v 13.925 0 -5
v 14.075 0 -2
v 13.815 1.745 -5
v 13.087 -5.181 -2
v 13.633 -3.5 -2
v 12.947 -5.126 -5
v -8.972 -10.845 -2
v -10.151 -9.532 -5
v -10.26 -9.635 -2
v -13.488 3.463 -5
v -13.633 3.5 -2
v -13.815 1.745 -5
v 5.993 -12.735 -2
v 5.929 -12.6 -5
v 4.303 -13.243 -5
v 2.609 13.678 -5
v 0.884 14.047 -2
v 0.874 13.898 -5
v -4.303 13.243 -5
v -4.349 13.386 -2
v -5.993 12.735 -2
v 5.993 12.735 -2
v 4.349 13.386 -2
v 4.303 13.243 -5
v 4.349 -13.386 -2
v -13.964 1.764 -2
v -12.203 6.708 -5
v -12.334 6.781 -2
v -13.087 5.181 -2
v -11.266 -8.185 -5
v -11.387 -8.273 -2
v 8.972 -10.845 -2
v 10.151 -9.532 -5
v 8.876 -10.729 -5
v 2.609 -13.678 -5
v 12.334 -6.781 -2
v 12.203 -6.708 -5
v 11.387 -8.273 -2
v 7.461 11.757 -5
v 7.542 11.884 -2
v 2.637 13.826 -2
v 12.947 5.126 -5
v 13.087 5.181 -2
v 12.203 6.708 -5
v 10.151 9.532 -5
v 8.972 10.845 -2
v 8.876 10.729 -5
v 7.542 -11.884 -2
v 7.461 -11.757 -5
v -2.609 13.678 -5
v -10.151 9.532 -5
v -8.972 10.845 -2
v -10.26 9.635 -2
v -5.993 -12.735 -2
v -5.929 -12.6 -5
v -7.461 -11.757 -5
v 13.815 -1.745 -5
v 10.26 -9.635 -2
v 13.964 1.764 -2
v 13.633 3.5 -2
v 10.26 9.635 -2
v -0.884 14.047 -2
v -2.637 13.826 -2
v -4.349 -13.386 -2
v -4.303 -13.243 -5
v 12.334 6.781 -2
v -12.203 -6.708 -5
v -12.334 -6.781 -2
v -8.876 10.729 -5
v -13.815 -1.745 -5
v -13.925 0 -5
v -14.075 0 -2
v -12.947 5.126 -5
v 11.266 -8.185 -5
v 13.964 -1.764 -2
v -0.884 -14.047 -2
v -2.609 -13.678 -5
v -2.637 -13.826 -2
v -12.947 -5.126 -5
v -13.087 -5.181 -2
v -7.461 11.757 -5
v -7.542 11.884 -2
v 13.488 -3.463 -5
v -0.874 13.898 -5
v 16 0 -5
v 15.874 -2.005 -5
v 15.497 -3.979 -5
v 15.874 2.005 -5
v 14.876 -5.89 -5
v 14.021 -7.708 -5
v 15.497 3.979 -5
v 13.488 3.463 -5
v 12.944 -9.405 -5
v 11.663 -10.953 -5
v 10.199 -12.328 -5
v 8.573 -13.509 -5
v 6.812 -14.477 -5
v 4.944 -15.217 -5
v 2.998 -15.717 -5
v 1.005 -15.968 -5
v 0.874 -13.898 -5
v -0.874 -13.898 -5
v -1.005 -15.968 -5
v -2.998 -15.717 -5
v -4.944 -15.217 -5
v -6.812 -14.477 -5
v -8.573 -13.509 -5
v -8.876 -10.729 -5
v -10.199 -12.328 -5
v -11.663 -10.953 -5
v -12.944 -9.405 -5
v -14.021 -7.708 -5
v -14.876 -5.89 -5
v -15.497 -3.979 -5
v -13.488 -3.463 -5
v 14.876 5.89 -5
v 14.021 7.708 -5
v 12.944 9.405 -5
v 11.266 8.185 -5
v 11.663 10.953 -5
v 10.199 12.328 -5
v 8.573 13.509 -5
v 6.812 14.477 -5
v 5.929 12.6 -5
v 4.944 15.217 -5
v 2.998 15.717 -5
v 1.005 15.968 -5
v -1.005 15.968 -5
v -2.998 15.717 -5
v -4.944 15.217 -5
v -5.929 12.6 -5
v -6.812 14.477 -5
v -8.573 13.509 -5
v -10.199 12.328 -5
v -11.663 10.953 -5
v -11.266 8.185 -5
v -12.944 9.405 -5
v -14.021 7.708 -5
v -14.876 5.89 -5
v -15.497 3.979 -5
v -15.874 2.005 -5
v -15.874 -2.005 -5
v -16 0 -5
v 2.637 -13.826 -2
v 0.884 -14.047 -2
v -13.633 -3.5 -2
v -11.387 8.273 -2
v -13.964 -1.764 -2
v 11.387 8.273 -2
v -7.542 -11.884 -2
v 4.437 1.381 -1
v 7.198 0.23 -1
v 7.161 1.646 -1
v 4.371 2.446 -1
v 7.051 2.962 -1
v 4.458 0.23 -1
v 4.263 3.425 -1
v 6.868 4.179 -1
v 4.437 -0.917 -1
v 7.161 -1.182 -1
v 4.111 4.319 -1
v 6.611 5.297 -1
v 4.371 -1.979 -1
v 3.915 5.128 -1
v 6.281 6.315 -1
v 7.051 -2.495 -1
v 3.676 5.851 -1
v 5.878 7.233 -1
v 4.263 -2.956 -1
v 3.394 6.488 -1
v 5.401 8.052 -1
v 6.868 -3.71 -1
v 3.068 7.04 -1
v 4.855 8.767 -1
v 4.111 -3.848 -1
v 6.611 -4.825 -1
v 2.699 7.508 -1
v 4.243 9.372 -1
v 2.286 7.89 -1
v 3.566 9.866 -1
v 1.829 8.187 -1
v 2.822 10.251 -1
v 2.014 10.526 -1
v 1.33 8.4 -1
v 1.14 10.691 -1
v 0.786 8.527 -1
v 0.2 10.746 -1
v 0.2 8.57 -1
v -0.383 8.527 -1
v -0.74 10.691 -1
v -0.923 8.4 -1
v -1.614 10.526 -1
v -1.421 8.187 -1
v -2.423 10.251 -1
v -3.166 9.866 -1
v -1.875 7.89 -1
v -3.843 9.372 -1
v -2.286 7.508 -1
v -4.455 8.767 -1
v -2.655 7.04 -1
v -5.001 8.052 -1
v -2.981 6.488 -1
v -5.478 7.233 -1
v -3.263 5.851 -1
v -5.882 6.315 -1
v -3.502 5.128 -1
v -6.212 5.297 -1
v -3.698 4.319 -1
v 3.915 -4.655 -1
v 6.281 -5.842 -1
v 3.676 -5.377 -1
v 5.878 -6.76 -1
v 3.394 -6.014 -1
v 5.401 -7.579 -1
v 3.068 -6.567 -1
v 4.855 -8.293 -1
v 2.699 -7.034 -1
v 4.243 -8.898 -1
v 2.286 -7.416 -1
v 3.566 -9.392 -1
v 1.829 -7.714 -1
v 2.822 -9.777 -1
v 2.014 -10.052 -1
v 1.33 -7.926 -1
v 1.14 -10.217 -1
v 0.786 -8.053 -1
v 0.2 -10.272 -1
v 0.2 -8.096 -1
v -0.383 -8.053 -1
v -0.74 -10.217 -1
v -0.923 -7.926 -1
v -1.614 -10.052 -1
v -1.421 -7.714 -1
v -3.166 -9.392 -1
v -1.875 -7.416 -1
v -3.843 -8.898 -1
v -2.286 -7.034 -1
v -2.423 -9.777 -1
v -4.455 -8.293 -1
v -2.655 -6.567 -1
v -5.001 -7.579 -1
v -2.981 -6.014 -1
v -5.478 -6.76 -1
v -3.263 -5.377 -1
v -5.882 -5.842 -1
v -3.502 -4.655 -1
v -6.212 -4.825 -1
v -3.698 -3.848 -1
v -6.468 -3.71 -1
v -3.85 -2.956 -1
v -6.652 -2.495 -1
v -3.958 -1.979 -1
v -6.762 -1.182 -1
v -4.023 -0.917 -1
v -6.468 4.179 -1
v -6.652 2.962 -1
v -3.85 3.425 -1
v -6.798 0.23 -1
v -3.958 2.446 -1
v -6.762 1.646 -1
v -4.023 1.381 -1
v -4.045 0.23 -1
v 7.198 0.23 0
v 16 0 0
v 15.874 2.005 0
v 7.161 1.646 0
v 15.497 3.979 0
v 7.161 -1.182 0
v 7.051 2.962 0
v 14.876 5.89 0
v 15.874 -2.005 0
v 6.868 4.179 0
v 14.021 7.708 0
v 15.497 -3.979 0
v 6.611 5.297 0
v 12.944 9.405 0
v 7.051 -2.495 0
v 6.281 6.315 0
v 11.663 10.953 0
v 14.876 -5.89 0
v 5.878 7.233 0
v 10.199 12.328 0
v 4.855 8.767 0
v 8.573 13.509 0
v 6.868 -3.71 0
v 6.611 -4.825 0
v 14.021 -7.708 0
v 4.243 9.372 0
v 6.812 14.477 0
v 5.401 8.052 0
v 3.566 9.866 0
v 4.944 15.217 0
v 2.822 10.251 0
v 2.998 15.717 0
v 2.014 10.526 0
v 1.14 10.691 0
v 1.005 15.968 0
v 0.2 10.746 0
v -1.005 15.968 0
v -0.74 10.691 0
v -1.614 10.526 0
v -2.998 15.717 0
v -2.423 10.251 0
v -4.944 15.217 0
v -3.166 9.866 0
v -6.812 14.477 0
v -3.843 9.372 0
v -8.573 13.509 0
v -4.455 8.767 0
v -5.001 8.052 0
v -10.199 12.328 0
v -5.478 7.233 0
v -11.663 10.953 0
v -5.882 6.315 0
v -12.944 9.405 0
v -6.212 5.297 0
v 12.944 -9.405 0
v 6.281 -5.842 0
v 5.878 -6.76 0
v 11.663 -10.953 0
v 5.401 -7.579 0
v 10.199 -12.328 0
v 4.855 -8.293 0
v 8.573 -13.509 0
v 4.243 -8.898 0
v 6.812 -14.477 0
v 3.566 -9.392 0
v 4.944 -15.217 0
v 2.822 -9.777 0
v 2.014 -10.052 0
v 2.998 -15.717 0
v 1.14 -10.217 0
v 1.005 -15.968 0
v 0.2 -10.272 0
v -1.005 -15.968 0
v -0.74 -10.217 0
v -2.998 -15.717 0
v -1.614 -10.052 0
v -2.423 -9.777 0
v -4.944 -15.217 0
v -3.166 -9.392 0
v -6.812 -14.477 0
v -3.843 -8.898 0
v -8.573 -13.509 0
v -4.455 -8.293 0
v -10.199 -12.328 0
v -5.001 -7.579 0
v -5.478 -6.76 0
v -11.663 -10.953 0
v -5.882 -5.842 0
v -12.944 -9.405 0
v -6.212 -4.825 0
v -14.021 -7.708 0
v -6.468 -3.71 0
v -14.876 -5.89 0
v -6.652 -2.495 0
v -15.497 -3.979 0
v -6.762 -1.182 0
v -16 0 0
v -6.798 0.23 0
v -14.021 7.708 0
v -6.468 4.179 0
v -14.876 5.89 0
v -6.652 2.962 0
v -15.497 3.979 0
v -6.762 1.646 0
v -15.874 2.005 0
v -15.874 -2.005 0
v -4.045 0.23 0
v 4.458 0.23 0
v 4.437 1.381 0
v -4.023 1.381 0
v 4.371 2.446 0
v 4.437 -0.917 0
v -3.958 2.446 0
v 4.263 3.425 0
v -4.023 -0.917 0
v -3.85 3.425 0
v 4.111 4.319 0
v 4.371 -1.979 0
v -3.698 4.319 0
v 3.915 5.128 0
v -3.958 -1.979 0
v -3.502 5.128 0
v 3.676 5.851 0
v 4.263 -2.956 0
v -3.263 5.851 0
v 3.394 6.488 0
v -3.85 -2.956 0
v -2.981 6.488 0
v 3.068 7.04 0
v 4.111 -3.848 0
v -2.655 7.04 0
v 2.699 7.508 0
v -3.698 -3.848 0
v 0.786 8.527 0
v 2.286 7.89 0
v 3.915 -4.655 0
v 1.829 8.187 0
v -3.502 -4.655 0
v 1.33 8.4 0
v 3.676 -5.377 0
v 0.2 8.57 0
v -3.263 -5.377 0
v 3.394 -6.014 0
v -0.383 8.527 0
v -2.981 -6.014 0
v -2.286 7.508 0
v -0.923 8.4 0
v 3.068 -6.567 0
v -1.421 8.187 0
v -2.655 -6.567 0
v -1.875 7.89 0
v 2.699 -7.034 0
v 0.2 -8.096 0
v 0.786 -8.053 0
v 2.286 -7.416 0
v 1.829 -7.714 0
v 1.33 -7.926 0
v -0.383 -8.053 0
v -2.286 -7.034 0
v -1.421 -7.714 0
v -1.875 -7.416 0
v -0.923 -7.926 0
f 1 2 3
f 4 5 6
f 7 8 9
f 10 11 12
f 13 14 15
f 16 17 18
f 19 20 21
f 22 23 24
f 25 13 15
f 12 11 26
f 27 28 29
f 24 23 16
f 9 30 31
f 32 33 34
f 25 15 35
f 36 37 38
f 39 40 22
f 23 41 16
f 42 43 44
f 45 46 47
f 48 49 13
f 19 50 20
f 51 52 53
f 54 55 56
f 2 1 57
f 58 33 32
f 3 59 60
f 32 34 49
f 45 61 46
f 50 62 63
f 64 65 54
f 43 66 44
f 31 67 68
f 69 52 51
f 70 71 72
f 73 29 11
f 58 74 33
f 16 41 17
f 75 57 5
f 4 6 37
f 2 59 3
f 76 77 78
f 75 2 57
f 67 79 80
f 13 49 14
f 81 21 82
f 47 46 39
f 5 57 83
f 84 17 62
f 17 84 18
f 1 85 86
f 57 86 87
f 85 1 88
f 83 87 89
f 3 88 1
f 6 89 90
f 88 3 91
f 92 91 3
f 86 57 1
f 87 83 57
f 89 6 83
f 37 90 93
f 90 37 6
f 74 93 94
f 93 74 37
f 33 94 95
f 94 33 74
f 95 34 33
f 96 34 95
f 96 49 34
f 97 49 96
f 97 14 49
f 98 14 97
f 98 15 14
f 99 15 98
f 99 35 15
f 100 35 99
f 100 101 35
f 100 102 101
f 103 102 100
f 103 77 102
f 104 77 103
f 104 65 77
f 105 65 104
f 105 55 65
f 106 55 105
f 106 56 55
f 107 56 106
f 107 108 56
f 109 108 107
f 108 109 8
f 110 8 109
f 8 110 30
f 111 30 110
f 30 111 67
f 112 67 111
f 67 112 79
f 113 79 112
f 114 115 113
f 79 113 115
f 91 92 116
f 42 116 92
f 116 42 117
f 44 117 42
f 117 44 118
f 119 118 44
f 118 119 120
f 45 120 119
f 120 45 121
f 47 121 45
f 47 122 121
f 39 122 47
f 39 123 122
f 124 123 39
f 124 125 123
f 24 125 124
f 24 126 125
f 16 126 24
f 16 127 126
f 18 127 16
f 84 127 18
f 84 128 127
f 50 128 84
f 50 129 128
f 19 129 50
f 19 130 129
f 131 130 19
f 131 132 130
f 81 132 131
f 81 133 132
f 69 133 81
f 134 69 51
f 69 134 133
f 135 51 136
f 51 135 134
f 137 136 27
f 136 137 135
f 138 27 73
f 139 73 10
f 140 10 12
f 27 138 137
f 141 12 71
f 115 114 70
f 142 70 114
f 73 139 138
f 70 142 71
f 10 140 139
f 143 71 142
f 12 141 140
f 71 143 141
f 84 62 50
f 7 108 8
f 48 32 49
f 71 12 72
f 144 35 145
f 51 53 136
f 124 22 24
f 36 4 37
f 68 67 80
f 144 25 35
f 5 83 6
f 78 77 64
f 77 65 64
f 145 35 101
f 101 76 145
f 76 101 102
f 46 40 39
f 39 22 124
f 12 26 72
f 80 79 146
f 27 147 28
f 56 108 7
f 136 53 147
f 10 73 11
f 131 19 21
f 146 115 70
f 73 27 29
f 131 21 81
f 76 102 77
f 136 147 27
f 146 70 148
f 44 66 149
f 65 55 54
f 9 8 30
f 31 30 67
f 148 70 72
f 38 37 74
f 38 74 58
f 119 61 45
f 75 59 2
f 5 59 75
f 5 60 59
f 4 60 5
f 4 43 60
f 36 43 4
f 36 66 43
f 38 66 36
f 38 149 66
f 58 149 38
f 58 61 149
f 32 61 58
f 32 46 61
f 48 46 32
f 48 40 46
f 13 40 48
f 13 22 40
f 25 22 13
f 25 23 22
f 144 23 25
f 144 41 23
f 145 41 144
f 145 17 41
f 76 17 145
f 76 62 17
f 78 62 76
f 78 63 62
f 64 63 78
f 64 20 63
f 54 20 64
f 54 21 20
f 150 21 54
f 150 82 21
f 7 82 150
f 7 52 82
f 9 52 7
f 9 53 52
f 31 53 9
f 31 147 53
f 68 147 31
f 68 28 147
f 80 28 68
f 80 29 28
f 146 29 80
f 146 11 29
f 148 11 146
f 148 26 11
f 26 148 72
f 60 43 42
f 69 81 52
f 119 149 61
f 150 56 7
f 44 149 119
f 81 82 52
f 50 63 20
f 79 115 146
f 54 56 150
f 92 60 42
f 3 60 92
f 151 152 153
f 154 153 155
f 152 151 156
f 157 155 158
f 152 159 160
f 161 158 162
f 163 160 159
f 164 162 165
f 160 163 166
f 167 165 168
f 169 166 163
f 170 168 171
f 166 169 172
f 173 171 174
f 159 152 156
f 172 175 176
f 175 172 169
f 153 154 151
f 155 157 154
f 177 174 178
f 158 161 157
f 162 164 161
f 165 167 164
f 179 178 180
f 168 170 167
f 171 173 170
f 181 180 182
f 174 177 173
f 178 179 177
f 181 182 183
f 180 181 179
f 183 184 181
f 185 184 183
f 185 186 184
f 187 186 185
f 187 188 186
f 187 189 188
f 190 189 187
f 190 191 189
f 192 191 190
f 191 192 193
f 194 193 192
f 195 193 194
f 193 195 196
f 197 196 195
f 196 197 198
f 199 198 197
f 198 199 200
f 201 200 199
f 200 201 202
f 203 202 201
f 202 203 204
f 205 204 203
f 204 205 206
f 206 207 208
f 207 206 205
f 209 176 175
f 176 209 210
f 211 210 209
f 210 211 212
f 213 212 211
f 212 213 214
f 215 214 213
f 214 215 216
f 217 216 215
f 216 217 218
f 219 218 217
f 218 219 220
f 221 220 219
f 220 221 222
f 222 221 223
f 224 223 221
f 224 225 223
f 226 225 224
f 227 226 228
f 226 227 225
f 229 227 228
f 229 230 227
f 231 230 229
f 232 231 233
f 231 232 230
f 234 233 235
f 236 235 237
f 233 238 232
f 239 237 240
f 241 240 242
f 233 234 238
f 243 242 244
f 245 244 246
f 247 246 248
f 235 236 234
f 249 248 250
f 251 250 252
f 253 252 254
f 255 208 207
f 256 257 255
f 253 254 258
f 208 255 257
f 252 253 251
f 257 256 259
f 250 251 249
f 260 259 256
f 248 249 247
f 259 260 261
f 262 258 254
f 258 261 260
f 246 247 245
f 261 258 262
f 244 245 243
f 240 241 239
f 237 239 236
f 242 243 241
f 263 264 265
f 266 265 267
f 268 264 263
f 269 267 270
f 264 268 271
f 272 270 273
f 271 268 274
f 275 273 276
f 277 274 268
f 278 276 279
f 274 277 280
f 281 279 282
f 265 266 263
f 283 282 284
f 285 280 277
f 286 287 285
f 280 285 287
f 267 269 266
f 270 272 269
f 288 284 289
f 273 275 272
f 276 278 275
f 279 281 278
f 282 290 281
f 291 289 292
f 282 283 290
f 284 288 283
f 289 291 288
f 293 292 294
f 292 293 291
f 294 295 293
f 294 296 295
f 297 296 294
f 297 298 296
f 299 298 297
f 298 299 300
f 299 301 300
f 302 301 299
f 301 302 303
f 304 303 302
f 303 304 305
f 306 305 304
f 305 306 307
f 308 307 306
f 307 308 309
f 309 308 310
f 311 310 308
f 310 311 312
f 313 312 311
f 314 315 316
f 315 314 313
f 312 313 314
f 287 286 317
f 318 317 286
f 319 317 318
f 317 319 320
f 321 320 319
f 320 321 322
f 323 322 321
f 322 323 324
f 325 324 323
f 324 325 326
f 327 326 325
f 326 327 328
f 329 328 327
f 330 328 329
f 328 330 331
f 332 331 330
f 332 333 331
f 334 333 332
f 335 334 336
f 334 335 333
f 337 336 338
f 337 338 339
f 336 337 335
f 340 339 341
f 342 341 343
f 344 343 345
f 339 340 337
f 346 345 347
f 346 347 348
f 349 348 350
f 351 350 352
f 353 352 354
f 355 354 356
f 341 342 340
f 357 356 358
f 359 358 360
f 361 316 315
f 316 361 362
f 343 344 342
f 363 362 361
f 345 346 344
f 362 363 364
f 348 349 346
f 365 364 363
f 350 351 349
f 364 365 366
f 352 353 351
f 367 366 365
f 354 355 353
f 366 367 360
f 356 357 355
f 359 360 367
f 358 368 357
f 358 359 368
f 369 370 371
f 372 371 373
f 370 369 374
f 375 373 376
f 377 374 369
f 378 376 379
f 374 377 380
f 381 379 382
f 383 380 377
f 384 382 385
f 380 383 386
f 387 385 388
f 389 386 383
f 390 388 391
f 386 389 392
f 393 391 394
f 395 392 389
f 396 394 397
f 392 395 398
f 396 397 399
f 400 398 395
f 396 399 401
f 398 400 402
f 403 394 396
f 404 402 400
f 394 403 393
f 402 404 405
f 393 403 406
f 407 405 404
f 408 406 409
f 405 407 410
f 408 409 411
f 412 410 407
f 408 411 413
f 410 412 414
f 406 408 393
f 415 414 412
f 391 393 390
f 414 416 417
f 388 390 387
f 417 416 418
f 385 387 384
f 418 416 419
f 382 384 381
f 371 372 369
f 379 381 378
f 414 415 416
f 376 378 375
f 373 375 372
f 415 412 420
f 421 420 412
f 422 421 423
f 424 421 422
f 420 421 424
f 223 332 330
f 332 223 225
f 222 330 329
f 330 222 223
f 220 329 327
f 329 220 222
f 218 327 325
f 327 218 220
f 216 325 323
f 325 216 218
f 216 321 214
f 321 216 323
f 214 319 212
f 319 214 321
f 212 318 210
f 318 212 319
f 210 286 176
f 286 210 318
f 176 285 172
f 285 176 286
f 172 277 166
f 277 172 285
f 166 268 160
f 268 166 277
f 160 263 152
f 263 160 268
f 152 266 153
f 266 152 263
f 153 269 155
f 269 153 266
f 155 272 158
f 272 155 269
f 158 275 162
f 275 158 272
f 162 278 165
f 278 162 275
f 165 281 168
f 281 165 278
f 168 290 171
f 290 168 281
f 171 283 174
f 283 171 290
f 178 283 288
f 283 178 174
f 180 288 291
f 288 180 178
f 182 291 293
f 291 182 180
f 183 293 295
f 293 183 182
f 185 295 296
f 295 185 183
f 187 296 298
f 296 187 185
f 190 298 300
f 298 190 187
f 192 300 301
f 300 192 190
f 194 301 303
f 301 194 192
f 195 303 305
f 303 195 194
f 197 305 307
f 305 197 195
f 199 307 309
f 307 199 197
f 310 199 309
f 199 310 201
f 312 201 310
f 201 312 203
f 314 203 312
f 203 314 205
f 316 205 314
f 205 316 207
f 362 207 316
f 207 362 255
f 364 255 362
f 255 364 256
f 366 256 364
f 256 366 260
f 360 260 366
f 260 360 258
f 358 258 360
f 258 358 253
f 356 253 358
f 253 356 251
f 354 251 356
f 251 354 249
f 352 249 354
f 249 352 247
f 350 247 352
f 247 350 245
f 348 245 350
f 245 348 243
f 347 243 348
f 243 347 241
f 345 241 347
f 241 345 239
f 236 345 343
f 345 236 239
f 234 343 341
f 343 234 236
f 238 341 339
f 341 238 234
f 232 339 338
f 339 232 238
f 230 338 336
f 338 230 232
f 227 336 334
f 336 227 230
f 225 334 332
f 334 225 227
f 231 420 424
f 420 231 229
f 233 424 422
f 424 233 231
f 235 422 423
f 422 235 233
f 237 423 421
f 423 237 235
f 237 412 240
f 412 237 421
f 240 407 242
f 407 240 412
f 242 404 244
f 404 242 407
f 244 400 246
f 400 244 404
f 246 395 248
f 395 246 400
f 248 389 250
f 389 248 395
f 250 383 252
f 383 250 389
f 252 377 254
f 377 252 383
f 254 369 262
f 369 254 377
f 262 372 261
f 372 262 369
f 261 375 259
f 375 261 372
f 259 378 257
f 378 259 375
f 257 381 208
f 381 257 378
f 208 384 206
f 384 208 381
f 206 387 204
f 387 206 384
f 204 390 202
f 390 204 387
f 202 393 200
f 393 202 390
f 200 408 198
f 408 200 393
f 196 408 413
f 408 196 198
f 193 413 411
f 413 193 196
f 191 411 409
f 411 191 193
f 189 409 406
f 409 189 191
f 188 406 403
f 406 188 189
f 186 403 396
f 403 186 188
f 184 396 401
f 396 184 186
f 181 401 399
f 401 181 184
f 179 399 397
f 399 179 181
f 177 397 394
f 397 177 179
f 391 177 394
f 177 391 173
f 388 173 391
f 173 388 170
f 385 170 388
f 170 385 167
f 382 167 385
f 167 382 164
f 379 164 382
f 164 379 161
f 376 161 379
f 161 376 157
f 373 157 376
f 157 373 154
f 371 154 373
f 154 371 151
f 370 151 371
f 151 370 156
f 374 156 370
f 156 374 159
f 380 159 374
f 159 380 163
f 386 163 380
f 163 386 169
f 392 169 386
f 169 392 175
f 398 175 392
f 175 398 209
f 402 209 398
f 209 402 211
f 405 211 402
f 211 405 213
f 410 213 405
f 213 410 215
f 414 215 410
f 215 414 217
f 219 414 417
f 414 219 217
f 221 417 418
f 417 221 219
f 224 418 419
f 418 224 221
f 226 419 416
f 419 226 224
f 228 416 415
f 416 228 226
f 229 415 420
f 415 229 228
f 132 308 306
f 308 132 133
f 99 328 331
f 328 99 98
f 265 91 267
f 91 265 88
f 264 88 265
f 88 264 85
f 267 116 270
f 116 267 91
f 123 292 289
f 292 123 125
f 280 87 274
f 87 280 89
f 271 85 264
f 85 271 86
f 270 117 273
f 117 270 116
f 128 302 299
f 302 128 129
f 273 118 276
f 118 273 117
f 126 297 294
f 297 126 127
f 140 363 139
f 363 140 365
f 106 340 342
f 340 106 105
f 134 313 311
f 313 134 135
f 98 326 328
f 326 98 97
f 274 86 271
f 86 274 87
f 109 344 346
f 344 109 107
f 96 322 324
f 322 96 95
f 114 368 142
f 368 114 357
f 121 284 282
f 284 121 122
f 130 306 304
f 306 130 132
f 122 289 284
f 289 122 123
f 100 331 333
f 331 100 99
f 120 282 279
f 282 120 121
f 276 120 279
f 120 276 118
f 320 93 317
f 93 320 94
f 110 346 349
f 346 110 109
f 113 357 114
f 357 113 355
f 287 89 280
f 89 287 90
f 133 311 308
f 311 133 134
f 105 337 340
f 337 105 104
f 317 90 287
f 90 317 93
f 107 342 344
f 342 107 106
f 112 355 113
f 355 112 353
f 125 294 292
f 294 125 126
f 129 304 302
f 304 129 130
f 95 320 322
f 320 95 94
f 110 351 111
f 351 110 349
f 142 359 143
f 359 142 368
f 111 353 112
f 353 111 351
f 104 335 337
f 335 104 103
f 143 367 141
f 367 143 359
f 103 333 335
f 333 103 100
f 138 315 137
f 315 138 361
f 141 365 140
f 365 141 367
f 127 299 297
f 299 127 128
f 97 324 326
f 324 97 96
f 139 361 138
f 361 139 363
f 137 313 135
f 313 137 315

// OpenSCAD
$fn = 50;


difference() {
	union() {
		translate(v = [0, 0, -5.0000000000]) {
			cylinder(h = 5, r = 16.0000000000);
		}
	}
	union() {
		#translate(v = [0, 0, -5.0000000000]) {
			cylinder(h = 3, r1 = 13.9250000000, r2 = 14.0750000000);
		}
		translate(v = [0, 0, -1]) {
			linear_extrude(height = 1) {
				text(font = "Impact", halign = "center", size = 20, text = "0", valign = "center");
			}
		}
	}
}
